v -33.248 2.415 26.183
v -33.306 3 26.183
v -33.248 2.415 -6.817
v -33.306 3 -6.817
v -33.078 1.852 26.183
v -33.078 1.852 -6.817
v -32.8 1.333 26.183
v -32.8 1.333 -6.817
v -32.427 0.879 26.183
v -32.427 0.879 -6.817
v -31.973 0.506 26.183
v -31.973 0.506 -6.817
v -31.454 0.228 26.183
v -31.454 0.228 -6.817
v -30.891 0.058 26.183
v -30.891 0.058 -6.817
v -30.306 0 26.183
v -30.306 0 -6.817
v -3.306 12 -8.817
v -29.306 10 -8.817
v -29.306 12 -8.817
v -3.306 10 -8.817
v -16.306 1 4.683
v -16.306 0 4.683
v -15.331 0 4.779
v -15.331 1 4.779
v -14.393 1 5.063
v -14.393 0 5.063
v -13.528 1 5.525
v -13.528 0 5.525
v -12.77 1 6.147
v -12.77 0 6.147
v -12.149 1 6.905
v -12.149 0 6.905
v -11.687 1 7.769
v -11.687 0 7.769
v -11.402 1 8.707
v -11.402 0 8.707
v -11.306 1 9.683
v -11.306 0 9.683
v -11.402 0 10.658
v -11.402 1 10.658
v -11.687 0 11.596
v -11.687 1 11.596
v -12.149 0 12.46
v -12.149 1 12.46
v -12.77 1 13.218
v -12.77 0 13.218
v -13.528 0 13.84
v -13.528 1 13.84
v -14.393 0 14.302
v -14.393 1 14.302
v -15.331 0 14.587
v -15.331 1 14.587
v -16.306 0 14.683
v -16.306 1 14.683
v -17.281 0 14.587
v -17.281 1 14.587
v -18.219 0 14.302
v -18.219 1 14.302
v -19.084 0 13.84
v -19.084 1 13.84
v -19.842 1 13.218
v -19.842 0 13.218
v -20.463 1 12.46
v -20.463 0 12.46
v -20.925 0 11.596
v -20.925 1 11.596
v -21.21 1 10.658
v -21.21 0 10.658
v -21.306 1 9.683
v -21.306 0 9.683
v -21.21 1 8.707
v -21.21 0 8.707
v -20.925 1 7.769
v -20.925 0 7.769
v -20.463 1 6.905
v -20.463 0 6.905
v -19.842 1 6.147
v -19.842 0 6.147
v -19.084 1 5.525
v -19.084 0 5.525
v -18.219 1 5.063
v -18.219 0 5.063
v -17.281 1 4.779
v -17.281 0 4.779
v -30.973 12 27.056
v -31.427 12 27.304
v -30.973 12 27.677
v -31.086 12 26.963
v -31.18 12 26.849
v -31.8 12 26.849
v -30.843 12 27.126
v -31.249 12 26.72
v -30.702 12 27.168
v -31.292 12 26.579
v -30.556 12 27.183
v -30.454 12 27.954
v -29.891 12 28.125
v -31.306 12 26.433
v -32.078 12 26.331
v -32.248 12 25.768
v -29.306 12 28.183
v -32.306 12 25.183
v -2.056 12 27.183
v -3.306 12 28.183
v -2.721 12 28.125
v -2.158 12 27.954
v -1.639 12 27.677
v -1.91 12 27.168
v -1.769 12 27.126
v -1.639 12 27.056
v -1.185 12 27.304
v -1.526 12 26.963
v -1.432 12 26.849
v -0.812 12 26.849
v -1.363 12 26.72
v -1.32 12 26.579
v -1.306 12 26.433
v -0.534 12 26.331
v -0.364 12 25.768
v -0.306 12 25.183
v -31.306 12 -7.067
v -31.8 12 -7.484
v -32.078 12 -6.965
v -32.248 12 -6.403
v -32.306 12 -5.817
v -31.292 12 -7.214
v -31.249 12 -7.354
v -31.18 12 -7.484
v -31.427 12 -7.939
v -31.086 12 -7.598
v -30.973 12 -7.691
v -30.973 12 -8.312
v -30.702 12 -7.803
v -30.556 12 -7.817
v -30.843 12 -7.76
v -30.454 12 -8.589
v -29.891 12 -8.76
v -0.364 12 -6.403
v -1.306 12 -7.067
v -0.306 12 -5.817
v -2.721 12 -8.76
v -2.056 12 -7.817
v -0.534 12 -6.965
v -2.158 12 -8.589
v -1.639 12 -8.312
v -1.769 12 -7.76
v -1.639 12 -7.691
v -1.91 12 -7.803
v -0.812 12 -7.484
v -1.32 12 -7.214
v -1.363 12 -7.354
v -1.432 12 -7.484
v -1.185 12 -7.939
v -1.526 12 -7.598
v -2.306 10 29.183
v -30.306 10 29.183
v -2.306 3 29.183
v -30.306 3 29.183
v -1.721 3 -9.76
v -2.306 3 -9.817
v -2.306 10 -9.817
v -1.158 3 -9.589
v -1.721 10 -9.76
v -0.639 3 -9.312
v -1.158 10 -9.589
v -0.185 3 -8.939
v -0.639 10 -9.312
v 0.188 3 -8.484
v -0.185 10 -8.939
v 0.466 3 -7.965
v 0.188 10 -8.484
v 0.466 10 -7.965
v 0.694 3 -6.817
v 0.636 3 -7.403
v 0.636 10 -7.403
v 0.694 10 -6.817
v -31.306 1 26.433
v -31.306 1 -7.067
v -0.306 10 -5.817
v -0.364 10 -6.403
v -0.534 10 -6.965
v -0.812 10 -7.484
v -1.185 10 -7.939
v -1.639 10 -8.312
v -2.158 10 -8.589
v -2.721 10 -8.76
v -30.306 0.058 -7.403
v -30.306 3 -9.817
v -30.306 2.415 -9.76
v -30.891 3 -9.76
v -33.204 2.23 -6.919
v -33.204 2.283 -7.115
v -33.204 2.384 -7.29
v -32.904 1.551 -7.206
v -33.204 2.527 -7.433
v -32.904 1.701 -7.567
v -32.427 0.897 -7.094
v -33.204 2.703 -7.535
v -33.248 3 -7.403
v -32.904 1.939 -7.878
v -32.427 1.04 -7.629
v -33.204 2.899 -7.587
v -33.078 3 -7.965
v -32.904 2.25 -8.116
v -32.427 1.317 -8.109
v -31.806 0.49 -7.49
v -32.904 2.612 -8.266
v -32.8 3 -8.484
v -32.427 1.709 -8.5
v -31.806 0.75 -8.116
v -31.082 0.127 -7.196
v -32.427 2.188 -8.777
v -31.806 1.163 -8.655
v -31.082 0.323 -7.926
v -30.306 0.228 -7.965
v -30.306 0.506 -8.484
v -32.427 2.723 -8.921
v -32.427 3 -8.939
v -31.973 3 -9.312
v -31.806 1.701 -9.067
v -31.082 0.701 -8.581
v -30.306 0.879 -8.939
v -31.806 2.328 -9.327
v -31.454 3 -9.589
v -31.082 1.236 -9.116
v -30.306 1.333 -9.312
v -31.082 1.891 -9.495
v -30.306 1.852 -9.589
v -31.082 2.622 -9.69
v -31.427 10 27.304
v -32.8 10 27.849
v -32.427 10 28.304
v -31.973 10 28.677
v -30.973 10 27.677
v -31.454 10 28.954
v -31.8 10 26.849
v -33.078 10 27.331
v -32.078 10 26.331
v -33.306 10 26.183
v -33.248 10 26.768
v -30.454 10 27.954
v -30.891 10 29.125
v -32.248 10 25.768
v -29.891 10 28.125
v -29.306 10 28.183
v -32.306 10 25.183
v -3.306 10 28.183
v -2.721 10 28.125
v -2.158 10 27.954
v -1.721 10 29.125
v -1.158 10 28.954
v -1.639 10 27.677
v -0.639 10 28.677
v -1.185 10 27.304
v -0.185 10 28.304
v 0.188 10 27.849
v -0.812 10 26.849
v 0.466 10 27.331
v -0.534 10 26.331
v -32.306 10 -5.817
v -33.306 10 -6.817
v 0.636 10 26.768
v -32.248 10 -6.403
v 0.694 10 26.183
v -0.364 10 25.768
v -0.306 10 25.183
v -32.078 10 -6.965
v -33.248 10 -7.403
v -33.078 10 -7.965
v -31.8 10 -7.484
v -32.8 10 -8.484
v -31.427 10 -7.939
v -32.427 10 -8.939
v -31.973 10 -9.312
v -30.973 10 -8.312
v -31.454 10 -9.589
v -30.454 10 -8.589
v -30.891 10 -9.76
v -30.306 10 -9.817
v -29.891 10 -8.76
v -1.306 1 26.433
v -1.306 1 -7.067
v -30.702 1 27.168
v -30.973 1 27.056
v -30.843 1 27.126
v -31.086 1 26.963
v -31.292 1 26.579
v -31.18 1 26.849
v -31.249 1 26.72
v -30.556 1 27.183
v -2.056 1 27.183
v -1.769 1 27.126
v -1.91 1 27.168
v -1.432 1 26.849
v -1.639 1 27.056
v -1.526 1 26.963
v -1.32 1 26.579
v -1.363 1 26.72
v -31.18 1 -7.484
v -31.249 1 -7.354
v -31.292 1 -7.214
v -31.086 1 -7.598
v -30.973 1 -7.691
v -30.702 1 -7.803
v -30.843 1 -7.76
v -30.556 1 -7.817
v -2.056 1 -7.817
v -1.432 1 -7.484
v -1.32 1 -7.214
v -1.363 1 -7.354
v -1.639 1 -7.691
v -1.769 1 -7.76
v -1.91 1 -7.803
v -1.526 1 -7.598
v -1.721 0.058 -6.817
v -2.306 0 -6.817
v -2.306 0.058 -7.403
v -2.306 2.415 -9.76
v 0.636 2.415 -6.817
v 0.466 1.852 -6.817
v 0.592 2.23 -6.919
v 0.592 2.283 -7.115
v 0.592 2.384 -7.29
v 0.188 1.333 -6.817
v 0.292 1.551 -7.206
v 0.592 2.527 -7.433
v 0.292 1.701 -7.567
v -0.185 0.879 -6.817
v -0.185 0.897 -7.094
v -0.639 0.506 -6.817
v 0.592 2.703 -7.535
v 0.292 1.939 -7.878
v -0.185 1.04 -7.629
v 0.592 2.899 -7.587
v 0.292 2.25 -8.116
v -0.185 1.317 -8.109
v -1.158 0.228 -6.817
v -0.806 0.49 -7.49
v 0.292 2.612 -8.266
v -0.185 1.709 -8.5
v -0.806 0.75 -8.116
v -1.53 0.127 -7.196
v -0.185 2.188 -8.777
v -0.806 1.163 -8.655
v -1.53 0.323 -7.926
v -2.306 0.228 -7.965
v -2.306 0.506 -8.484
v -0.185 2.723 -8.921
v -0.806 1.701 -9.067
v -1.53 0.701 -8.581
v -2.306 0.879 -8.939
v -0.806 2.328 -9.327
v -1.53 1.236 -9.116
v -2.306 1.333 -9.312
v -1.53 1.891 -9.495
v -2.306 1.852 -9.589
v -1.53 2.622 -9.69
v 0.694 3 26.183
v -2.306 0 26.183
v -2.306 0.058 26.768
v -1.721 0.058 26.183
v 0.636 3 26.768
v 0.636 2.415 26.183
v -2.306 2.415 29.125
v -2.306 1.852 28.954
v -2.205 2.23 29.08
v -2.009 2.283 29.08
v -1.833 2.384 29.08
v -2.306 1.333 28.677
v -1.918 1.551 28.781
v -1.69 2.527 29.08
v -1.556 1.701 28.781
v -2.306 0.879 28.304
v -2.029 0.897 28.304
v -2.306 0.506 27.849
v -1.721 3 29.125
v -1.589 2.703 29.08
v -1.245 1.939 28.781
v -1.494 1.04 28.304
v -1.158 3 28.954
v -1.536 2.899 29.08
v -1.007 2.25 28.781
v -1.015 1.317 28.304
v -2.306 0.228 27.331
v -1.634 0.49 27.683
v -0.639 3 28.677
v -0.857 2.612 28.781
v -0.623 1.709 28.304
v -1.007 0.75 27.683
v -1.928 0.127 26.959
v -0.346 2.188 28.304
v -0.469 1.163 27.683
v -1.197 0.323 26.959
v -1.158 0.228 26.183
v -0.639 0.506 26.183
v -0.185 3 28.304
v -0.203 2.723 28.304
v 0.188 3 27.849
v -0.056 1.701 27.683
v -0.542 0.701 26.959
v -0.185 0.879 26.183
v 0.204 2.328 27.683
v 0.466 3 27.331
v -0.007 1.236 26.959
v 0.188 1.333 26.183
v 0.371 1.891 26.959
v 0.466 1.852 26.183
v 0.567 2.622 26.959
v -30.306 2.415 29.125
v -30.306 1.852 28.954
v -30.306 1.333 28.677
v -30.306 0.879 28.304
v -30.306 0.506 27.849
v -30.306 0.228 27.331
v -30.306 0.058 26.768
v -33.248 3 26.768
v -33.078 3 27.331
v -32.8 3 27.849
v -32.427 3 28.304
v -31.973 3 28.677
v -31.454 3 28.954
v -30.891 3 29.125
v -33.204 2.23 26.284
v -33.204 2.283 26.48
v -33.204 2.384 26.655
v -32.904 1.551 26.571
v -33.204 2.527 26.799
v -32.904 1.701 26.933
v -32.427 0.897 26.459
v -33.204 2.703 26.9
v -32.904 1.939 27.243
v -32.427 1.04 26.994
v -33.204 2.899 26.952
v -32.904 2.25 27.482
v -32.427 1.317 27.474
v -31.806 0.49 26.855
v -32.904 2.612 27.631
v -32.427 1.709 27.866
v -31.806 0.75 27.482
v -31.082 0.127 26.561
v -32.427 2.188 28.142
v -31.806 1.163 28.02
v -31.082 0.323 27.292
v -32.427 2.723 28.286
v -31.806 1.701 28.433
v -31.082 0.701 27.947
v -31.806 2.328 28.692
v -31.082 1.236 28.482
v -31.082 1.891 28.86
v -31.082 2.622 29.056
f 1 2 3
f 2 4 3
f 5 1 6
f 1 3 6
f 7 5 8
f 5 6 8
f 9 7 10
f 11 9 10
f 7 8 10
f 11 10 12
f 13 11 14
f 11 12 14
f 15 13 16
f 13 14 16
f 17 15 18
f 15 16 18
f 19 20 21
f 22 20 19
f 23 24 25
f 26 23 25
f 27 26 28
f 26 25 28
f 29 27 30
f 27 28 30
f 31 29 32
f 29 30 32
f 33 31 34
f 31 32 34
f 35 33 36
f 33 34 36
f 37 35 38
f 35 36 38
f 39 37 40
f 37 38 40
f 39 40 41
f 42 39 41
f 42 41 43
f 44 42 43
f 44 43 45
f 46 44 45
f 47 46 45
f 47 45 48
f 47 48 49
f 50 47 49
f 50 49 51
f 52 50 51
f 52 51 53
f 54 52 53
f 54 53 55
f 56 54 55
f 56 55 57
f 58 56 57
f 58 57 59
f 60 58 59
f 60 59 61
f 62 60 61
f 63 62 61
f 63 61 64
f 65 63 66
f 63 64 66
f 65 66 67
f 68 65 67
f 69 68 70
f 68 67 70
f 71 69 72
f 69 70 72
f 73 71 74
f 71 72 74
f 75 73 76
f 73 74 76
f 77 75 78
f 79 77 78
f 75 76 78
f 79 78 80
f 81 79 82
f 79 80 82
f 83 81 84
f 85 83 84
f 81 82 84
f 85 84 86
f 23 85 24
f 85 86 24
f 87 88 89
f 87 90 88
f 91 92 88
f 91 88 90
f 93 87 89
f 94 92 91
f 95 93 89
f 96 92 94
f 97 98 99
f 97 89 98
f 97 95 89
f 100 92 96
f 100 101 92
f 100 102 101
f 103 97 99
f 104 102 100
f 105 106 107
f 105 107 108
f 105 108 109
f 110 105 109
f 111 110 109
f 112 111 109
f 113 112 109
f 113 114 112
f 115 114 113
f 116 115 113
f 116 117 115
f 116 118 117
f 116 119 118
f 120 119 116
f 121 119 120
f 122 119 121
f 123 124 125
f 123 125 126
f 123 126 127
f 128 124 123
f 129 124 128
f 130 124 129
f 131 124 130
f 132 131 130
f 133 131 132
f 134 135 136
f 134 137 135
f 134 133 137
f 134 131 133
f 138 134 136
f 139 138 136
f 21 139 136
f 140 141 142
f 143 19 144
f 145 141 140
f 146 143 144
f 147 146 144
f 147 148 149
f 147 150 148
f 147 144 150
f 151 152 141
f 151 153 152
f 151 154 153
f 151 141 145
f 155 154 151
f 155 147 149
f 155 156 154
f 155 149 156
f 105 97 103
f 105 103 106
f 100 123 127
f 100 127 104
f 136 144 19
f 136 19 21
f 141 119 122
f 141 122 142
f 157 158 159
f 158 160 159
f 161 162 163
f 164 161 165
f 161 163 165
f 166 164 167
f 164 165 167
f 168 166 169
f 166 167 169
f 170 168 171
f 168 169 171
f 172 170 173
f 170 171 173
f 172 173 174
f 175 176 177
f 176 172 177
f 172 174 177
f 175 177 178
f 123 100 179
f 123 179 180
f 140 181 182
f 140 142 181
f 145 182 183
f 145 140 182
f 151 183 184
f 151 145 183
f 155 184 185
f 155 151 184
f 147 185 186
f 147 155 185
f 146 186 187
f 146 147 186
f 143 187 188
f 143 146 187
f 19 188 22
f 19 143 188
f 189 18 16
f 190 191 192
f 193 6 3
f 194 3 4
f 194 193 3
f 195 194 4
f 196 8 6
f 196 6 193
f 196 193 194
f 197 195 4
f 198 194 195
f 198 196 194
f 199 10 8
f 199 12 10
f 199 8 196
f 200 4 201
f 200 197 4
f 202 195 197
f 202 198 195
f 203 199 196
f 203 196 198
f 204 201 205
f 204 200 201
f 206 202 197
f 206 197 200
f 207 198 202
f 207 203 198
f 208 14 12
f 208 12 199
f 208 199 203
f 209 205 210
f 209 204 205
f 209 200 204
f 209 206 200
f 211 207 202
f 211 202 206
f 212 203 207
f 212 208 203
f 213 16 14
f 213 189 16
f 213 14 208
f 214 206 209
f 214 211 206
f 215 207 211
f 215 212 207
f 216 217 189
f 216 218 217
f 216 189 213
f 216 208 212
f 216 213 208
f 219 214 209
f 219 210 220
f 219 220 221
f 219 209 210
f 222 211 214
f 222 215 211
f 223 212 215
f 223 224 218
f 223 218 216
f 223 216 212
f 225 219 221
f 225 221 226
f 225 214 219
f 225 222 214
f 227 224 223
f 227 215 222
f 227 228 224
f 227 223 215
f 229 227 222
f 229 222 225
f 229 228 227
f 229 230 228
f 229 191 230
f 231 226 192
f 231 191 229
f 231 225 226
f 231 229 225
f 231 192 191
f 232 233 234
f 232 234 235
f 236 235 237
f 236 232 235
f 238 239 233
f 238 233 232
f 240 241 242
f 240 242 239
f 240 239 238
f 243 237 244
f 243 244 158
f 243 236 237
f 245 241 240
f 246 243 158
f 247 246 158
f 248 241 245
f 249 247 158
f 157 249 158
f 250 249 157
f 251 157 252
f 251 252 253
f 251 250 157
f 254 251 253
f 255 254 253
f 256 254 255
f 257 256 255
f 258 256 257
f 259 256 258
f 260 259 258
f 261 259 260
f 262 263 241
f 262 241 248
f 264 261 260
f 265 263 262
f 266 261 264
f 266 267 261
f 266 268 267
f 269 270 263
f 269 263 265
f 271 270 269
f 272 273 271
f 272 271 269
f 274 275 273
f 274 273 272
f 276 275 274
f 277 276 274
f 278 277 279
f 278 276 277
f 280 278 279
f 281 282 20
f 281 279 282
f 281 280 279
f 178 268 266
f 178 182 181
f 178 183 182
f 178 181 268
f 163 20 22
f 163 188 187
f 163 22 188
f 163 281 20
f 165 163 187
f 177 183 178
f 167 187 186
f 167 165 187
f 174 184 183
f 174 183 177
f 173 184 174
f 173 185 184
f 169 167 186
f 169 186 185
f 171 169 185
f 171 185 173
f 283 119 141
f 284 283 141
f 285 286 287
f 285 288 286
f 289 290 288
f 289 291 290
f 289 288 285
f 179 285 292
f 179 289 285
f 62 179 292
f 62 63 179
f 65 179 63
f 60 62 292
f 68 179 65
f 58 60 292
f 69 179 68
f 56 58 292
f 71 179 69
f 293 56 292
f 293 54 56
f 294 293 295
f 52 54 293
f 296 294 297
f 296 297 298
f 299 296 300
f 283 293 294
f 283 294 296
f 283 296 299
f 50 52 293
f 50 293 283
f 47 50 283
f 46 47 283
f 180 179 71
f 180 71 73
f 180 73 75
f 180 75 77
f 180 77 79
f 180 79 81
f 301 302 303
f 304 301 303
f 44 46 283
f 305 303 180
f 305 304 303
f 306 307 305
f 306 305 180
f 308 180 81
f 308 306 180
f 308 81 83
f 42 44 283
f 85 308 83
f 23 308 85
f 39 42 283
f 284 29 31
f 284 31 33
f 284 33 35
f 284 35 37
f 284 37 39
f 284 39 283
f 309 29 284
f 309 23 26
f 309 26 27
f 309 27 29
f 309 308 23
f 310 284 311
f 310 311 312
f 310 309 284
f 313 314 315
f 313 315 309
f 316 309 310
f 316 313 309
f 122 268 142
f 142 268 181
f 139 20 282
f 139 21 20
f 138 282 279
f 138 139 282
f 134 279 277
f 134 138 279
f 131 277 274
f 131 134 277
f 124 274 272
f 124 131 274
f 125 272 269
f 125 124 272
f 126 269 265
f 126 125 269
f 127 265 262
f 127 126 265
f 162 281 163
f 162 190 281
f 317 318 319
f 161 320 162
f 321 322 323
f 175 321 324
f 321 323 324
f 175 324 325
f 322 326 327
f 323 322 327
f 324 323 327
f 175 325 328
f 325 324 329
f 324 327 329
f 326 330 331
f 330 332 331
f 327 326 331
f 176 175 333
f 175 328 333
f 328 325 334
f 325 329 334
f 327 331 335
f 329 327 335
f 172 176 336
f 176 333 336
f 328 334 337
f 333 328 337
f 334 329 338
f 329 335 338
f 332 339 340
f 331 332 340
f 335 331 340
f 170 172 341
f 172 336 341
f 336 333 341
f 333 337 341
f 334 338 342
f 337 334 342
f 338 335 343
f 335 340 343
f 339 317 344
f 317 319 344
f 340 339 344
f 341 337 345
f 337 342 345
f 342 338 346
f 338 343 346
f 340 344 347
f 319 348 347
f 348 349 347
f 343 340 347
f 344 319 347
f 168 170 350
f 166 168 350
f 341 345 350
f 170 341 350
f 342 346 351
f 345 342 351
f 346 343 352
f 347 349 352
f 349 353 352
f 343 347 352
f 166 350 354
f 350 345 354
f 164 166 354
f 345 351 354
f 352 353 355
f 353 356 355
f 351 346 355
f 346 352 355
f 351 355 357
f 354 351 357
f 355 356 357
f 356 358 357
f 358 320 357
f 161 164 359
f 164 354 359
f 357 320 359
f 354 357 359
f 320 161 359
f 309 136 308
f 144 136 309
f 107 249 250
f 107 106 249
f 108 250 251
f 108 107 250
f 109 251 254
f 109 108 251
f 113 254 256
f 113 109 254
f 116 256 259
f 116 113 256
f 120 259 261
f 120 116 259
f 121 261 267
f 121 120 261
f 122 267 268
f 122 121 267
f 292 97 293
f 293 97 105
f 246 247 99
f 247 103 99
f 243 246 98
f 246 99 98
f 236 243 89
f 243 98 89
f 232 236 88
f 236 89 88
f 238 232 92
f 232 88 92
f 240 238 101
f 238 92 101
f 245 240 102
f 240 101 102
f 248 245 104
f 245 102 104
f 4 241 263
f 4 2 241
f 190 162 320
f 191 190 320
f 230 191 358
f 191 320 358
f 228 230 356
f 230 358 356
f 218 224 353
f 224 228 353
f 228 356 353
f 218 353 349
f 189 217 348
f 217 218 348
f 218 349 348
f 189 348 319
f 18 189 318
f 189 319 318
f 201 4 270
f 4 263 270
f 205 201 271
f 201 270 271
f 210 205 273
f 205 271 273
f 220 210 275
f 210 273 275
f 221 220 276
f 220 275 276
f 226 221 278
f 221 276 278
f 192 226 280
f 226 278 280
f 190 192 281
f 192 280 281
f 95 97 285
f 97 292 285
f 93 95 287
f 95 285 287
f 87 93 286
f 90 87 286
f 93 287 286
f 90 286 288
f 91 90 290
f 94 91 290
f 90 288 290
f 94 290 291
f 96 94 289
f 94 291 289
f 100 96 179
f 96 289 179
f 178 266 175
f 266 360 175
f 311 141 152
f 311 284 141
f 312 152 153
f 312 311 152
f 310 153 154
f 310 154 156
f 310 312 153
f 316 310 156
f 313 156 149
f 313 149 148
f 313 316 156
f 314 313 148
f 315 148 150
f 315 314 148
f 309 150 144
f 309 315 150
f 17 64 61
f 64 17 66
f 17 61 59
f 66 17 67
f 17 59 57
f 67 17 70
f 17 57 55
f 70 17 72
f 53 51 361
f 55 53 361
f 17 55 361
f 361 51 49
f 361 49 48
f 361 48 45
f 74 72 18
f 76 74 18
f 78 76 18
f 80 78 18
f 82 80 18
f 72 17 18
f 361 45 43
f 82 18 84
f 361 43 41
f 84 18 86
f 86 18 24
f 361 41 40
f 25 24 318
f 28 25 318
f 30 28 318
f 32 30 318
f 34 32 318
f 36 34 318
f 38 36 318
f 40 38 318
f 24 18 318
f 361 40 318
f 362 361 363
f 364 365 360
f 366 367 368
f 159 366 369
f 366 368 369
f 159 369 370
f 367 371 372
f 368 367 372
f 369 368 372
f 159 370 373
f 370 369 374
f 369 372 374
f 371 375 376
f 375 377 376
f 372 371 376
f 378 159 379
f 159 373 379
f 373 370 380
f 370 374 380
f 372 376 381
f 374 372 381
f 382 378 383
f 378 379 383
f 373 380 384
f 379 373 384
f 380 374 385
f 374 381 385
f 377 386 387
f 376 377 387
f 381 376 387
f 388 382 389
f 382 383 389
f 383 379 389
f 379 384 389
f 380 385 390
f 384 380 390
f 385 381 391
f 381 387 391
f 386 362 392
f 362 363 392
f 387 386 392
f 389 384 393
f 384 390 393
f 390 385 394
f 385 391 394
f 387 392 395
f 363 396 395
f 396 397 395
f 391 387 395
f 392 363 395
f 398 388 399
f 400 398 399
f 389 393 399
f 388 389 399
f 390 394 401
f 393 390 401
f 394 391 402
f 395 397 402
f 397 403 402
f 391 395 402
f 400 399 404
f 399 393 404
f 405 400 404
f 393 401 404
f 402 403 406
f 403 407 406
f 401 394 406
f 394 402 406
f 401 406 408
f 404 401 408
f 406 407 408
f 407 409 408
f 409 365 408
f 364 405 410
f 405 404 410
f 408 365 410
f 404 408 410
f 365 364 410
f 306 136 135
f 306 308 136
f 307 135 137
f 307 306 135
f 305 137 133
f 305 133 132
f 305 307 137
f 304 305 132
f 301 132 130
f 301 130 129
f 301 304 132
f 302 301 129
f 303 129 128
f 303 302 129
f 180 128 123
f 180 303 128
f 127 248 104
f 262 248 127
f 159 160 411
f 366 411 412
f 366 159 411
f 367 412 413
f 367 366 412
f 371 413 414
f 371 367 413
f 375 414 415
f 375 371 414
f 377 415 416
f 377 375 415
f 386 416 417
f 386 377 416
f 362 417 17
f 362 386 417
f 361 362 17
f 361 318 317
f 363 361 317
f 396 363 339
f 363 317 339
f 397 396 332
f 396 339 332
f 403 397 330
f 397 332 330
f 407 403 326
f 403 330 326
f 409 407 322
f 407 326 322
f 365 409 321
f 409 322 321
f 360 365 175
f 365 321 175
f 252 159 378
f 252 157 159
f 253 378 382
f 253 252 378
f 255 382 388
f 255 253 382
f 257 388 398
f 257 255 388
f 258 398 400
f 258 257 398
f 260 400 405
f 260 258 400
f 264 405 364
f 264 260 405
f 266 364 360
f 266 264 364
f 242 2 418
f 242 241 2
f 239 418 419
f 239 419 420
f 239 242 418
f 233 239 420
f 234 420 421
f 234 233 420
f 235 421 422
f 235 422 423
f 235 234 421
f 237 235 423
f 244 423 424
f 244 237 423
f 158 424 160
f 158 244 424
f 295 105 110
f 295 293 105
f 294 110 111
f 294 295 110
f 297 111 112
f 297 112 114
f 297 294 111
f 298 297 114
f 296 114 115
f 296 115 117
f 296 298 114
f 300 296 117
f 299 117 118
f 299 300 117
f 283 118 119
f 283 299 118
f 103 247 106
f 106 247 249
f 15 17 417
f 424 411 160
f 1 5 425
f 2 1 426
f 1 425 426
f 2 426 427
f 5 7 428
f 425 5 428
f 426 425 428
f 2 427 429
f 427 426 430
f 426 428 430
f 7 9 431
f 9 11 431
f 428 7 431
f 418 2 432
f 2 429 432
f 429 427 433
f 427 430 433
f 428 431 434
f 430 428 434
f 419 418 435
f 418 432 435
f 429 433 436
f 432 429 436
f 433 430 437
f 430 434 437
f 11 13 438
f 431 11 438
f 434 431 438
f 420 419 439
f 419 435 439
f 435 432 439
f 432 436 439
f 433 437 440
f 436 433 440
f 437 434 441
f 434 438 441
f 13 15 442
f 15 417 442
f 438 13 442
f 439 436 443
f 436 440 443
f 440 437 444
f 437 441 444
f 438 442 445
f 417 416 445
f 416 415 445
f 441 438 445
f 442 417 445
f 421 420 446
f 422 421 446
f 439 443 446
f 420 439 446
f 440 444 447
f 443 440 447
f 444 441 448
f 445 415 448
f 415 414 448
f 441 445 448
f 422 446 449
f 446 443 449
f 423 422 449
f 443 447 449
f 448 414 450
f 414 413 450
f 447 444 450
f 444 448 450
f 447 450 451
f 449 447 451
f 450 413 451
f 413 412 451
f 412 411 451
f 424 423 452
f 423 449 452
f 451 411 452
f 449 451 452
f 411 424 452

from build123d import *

# Parameters (mm, degrees)
SCHIZZO1_W                   = 34
SCHIZZO1_H                   = 39
ESTRUSIONE_ESTRUSIONE1_DEPTH = 10
SCHIZZO4_W                   = 32
SCHIZZO4_H                   = 37
ESTRUSIONE_ESTRUSIONE2_DEPTH = 2
SCHIZZO5_W                   = 30
SCHIZZO5_H                   = 35
TAGLIO_ESTRUSIONE2_DEPTH     = 11
RACCORDO1_R                  = 3
RACCORDO2_R                  = 0.75
TAGLIO_ESTRUSIONE3_REACH     = 47.879
SCHIZZO6_R                   = 5


with BuildPart() as part:
    # Schizzo1 → Estrusione-Estrusione1 (new body)
    with BuildSketch(Plane(origin=(0, 0, 0), x_dir=(1, 0, 0), z_dir=(0, 1, 0))):
        with Locations((-16.306007172, -9.682590788)):
            Rectangle(SCHIZZO1_W, SCHIZZO1_H)
    extrude(amount=ESTRUSIONE_ESTRUSIONE1_DEPTH)

    # Schizzo4 → Estrusione-Estrusione2 (add)
    with BuildSketch(Plane(origin=(0, 10, 0), x_dir=(1, 0, 0), z_dir=(0, 1, 0))):
        with Locations((-16.306007172, -9.682590788)):
            Rectangle(SCHIZZO4_W, SCHIZZO4_H)
    extrude(amount=ESTRUSIONE_ESTRUSIONE2_DEPTH)

    # Schizzo5 → Taglio-Estrusione2 (cut)
    with BuildSketch(Plane(origin=(0, 12, 0), x_dir=(1, 0, 0), z_dir=(0, 1, 0))):
        with Locations((-16.306007172, -9.682590788)):
            Rectangle(SCHIZZO5_W, SCHIZZO5_H)
    extrude(amount=-TAGLIO_ESTRUSIONE2_DEPTH, mode=Mode.SUBTRACT)

    # Raccordo1
    raccordo1_edges = [part.edges().sort_by_distance(p)[0] for p in [
        (-32.306007172, 11, -8.817409212),
        (-32.306007172, 11, 28.182590788),
        (-0.306007172, 11, 28.182590788),
        (-0.306007172, 11, -8.817409212),
        (-16.306007172, 0, -9.817409212),
        (0.693992828, 0, 9.682590788),
        (-16.306007172, 0, 29.182590788),
        (-33.306007172, 0, 9.682590788),
        (-33.306007172, 5, -9.817409212),
        (0.693992828, 5, -9.817409212),
        (0.693992828, 5, 29.182590788),
        (-33.306007172, 5, 29.182590788),
    ]]
    fillet(raccordo1_edges, radius=RACCORDO1_R)

    # Raccordo2
    raccordo2_edges = [part.edges().sort_by_distance(p)[0] for p in [
        (-31.306007172, 6.5, 27.182590788),
        (-31.306007172, 6.5, -7.817409212),
        (-1.306007172, 6.5, -7.817409212),
        (-1.306007172, 6.5, 27.182590788),
    ]]
    fillet(raccordo2_edges, radius=RACCORDO2_R)

    # Schizzo6 → Taglio-Estrusione3 (cut, up to next)
    with BuildSketch(Plane.XZ, mode=Mode.PRIVATE) as taglio_estrusione3_sk1:
        with Locations(Location((-16.306007172, 9.682590788, 0), (0, 0, 270))):
            Circle(SCHIZZO6_R)
    taglio_estrusione3_tool1 = extrude(taglio_estrusione3_sk1.sketch, amount=-TAGLIO_ESTRUSIONE3_REACH, mode=Mode.PRIVATE) & part.part
    add(taglio_estrusione3_tool1.solids().sort_by_distance((-16.306007, 0, 9.682591))[0], mode=Mode.SUBTRACT)


solid = part.part
